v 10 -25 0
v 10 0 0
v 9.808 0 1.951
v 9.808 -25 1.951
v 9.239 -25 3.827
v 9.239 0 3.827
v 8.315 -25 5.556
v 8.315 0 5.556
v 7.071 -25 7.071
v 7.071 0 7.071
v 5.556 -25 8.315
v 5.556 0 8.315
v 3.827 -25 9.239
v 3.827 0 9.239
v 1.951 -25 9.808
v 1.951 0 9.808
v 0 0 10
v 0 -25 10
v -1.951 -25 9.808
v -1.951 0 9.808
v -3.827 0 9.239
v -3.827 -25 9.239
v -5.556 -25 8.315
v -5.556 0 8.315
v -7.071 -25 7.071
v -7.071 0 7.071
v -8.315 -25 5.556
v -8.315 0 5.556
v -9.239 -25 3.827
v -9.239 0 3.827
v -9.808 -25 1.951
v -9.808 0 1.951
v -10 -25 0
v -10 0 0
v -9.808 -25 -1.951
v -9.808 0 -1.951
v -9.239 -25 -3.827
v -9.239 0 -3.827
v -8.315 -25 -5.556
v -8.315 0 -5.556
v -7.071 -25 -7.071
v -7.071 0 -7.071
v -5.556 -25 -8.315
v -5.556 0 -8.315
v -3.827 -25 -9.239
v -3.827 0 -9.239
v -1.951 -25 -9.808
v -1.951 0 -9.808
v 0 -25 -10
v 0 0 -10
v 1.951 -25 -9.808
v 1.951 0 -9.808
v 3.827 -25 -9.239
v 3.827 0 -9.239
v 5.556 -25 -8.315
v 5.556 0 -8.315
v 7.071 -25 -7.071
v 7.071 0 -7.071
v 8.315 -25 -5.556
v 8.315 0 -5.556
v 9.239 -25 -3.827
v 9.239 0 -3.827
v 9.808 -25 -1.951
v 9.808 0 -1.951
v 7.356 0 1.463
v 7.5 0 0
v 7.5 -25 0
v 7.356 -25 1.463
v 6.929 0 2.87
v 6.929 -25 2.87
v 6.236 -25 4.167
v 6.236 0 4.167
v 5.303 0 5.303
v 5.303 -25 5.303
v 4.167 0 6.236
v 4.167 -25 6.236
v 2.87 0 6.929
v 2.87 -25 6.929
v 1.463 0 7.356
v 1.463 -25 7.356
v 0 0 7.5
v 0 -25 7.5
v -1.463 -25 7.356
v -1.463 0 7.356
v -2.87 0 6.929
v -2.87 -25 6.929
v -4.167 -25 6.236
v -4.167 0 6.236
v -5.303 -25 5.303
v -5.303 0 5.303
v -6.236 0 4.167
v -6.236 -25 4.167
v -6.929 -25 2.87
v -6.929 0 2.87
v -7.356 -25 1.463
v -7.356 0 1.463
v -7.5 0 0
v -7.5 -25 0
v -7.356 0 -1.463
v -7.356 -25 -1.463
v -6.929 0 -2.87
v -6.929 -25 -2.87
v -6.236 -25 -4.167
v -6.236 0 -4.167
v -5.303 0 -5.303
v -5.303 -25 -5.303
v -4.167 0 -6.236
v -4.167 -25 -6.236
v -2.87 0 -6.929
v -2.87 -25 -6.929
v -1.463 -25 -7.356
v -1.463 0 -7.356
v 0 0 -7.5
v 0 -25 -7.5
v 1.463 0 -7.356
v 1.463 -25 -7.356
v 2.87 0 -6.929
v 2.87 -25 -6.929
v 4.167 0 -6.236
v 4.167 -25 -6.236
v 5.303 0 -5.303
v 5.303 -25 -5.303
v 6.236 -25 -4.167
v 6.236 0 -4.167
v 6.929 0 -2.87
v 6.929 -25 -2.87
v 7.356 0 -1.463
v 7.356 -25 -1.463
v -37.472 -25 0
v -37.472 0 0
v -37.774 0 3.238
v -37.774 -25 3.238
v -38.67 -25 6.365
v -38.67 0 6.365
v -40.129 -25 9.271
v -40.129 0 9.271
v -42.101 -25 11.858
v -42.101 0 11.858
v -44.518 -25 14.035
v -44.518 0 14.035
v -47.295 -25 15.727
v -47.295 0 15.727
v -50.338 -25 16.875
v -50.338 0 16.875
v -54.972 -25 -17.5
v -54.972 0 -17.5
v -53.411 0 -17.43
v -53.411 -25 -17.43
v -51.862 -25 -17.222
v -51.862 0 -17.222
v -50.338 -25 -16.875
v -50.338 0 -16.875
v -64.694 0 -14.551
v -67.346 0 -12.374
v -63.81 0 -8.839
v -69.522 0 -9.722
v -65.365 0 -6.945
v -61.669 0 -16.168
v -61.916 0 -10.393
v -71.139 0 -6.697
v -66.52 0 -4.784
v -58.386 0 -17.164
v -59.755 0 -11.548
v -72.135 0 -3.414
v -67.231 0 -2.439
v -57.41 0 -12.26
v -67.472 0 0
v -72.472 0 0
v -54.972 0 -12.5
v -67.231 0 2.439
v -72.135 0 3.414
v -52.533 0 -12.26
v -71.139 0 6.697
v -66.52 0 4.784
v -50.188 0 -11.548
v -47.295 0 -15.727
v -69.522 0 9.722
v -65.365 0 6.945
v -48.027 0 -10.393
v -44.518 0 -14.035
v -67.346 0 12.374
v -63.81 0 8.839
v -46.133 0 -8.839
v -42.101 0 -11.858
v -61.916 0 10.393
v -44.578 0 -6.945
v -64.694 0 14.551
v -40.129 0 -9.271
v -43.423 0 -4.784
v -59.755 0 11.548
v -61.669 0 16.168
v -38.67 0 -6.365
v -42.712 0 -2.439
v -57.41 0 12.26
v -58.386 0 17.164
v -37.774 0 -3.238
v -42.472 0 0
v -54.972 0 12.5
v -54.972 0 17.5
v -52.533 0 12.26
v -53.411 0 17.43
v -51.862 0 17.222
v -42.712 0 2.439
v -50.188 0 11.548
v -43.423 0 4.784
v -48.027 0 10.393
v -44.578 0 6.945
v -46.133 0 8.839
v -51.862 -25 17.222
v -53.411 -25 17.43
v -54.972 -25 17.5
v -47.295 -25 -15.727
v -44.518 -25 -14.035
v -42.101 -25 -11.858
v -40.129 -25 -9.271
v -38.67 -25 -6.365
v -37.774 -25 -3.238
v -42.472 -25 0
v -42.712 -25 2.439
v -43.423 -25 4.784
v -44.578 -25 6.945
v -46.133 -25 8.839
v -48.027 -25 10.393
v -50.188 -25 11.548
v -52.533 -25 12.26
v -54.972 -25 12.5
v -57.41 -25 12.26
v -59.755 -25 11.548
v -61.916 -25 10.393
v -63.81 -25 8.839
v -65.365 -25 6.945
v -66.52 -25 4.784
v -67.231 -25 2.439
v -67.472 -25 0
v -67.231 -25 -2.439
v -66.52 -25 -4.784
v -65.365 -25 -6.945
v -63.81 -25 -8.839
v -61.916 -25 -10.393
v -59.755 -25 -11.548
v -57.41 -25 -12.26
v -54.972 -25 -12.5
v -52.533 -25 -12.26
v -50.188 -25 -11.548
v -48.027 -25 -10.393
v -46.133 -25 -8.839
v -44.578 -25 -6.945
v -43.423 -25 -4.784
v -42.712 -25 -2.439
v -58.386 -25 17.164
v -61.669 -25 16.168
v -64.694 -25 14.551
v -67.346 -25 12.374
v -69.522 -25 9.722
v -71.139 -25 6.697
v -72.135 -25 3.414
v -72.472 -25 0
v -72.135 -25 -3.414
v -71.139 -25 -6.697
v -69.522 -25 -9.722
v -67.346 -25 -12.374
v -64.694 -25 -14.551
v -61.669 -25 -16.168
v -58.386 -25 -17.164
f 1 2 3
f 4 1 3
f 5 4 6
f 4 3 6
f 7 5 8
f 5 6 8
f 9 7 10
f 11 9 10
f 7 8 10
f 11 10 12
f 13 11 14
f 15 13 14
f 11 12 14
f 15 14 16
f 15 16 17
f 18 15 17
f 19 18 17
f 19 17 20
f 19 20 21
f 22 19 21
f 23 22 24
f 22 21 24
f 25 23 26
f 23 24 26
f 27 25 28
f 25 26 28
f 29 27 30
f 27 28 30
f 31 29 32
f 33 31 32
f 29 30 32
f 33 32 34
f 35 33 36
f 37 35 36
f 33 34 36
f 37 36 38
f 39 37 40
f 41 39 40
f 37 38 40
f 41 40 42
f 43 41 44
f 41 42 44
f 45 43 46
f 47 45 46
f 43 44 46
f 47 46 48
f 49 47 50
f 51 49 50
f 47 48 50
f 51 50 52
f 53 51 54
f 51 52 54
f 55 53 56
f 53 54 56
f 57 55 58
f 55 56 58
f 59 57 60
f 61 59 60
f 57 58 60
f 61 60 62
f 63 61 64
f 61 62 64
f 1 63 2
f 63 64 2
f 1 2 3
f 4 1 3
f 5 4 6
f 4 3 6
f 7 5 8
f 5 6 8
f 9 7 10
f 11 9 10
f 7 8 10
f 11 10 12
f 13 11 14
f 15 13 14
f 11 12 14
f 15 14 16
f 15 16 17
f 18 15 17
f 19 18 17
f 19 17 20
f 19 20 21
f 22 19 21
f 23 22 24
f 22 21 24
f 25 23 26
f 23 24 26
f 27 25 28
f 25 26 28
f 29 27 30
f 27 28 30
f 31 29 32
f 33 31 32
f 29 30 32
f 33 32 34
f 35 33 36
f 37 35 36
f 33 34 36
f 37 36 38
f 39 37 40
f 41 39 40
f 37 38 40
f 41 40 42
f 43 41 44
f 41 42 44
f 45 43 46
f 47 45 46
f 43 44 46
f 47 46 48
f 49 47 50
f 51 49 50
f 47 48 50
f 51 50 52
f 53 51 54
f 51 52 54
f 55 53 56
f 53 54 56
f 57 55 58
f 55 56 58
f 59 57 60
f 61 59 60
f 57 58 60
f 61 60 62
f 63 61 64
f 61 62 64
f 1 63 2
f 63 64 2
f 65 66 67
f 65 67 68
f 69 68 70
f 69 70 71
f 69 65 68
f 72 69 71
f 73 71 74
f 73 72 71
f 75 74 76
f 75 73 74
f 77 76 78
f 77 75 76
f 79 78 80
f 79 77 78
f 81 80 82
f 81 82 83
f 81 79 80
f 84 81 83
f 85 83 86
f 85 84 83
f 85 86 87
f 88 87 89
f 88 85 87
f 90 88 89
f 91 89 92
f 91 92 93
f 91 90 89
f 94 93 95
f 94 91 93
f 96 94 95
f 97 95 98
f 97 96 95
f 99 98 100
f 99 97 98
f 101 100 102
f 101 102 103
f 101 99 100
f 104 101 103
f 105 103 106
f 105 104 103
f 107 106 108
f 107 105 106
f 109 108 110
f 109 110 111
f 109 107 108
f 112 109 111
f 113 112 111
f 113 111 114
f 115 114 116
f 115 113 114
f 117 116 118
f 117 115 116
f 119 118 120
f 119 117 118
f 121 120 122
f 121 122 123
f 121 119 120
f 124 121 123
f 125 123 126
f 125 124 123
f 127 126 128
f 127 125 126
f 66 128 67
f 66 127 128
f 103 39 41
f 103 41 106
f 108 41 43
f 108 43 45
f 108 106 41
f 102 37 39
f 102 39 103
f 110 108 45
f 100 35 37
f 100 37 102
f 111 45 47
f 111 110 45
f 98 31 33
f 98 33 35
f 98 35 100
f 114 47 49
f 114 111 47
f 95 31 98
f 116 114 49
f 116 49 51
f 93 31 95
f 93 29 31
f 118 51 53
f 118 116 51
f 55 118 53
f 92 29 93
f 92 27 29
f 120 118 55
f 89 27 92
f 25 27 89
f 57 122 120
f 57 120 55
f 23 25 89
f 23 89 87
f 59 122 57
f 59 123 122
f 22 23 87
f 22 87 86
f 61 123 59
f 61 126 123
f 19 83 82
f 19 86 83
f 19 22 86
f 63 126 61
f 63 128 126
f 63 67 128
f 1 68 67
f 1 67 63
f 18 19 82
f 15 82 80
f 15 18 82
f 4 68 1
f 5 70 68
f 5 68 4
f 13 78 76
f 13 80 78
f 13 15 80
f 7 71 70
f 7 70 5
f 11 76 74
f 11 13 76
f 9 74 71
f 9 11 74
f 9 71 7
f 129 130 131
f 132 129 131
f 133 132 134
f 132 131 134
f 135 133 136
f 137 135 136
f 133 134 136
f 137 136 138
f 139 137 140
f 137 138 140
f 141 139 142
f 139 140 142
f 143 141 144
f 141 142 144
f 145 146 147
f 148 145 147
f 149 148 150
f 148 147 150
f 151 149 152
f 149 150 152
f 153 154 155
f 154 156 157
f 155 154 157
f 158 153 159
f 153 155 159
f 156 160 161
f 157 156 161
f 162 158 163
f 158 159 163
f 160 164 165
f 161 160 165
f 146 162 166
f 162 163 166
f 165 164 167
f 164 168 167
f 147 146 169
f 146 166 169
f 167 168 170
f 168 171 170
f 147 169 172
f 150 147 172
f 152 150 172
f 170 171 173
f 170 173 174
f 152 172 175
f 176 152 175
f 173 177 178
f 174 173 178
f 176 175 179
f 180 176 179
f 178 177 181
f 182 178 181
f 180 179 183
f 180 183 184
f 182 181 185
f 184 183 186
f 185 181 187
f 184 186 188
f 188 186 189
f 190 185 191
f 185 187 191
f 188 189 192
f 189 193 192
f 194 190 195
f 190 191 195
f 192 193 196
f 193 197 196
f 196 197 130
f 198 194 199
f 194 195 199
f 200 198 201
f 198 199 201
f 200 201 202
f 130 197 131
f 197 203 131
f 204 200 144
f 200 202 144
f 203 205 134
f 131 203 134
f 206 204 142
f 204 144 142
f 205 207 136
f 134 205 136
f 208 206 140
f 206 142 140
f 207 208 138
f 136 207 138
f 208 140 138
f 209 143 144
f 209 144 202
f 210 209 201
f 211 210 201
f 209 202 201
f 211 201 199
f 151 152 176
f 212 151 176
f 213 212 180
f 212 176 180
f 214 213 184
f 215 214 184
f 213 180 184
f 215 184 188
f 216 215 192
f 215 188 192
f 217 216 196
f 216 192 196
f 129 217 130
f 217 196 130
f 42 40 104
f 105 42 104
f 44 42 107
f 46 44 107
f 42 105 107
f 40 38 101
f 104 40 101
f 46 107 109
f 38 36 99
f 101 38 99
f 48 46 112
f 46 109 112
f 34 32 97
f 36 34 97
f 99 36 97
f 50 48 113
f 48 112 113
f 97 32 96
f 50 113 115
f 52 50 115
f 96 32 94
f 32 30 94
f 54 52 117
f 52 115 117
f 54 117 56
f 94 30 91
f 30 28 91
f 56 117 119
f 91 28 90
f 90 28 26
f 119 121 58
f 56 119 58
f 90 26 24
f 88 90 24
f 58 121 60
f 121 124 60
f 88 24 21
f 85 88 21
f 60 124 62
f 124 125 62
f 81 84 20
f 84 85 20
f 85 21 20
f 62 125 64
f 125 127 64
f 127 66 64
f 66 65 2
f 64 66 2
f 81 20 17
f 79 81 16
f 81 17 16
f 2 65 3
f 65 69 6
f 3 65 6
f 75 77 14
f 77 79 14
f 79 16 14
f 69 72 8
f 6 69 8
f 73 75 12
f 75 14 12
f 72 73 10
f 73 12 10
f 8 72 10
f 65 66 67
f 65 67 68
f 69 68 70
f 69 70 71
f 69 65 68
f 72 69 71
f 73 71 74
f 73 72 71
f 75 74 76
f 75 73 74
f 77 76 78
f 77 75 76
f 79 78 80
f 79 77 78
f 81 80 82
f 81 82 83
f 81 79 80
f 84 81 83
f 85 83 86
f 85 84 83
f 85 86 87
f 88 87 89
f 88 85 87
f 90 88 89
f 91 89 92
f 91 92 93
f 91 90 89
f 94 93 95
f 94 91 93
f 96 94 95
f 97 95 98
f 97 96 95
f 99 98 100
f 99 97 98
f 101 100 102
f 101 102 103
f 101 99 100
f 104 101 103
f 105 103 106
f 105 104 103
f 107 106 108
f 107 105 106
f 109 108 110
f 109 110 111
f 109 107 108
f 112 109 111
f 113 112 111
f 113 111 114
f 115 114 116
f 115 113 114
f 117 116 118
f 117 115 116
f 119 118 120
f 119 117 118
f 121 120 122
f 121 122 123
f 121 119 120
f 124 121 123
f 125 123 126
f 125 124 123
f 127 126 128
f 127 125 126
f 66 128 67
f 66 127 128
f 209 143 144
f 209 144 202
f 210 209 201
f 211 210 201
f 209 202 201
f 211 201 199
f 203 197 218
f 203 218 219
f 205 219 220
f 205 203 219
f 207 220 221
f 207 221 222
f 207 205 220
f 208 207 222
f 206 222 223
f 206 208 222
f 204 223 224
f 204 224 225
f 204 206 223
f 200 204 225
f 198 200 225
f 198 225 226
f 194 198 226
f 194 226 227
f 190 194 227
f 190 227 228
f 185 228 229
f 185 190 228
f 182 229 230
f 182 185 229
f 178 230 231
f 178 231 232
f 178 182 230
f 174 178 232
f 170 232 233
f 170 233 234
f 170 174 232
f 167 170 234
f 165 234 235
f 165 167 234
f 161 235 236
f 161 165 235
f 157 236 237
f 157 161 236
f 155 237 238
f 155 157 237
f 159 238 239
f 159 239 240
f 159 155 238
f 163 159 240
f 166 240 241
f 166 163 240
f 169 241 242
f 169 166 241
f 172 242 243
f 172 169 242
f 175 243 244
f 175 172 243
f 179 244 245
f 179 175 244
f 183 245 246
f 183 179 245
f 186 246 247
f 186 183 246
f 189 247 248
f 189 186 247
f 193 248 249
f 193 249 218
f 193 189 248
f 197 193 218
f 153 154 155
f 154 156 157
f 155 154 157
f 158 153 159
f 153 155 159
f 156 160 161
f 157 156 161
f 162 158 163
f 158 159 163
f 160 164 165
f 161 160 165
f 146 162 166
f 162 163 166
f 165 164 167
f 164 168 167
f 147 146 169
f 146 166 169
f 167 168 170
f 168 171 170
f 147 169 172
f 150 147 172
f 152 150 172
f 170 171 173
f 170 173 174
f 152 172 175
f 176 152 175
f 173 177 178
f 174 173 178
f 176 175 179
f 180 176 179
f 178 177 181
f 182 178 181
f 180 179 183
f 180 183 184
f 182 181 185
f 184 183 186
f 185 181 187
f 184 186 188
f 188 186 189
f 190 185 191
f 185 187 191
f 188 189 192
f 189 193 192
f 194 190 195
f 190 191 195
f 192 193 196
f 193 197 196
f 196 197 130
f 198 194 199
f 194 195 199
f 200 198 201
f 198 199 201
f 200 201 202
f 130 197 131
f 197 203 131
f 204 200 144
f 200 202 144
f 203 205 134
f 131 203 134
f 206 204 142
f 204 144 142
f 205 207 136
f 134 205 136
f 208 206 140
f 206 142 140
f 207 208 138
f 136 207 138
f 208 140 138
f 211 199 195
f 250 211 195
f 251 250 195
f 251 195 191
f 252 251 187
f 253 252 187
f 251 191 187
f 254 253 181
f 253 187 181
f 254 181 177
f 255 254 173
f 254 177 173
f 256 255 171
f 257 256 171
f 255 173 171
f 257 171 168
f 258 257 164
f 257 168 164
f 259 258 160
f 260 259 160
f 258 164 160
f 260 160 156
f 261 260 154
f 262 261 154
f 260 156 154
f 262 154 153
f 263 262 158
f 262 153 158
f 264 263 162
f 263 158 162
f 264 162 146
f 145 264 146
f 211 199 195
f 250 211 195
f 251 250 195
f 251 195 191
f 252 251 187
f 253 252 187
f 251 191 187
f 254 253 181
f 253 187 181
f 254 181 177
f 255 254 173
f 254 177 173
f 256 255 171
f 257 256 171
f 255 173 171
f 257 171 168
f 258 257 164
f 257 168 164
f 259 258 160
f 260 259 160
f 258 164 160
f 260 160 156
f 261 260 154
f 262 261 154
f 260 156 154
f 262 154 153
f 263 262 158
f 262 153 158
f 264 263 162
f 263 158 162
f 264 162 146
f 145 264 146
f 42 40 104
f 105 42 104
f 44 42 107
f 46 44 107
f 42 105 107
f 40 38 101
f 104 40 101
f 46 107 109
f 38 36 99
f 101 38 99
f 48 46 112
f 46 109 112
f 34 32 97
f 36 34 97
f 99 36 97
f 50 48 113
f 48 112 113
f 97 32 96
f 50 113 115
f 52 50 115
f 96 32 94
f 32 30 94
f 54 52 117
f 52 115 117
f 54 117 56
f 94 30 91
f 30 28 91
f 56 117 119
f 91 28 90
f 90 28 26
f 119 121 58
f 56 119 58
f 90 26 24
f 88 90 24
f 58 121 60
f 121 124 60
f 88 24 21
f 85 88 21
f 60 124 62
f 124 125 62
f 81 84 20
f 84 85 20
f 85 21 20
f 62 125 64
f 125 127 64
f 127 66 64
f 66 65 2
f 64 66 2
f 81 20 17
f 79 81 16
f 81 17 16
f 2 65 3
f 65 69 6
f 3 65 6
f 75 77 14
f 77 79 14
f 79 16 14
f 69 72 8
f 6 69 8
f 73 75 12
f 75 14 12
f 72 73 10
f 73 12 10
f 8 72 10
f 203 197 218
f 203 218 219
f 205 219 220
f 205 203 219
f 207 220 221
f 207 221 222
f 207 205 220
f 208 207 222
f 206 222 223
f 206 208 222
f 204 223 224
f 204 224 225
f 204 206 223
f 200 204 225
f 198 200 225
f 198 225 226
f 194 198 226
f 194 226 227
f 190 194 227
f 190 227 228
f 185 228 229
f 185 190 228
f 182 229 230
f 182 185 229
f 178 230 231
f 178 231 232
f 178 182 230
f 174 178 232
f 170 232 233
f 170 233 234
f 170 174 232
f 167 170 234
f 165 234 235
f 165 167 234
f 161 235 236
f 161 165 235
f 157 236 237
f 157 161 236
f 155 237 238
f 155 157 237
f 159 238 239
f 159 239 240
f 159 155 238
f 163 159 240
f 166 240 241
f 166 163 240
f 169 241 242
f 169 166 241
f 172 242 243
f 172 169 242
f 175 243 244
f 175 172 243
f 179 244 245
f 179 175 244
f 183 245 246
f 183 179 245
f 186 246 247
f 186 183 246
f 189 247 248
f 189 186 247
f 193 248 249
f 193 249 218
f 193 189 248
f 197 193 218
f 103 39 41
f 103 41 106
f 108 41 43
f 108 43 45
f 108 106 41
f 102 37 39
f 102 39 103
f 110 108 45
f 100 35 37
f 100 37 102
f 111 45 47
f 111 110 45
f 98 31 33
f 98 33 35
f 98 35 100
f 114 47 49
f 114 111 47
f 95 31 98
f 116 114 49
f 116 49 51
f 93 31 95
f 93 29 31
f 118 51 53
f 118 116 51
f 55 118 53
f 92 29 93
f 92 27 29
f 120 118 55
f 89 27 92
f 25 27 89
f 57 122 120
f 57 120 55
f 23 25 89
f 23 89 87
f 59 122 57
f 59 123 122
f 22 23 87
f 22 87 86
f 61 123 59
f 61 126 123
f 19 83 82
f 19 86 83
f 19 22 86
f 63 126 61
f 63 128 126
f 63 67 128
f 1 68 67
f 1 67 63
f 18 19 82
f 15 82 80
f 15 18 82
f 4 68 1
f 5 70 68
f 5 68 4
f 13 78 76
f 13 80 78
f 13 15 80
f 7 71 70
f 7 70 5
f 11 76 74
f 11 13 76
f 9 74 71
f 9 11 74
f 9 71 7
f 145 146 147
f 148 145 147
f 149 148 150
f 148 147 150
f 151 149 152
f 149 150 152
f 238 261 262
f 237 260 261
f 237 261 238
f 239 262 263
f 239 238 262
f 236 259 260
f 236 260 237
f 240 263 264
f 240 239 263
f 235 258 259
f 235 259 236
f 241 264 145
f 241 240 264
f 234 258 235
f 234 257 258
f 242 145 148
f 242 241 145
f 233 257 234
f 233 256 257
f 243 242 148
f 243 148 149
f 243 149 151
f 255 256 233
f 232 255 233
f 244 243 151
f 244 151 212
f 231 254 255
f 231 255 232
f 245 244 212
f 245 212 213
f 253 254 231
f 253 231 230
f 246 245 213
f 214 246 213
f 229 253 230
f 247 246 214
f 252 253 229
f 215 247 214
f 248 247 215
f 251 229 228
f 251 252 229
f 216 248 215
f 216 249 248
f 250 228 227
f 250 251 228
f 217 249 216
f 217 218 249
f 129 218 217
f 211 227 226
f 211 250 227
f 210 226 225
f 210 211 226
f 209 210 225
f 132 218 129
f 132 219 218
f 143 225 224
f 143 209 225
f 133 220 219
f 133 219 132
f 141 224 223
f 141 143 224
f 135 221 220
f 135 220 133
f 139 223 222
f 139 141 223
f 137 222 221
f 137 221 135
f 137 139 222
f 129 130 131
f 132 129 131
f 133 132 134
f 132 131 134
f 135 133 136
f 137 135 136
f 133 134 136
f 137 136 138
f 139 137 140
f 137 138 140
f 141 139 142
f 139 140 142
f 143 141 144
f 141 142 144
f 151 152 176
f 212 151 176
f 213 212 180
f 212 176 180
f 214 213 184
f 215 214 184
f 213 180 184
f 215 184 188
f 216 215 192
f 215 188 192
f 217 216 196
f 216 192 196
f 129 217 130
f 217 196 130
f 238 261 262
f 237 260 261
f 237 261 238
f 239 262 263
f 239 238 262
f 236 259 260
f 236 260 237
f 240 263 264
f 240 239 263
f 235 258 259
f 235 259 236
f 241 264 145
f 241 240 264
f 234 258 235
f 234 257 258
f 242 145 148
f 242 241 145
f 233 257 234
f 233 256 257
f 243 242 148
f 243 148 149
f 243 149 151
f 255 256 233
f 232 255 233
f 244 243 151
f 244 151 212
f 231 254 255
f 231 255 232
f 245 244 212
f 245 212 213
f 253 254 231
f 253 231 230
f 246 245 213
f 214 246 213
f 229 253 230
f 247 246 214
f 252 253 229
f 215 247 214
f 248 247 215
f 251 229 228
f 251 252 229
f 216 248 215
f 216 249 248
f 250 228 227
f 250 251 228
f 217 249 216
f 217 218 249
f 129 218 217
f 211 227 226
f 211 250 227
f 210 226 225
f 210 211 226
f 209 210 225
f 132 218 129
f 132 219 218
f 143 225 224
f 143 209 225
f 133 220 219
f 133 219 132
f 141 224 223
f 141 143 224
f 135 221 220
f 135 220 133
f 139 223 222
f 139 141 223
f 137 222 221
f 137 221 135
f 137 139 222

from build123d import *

# Parameters (mm, degrees)
F0_R     = 12.5
F0_R_2   = 10
F0_R_3   = 7.5
F1_DEPTH = 25
F2_DEPTH = 25


with BuildPart() as f1:
    # F0 (on Front) → F1 (new body)
    with BuildSketch(Plane.XZ):
        with BuildLine():
            Line((-50.338149, 16.875463), (-54.971586, 17.5))
            ThreePointArc((-54.971586, 17.5), (-72.471586, 0), (-54.971586, -17.5))
            Line((-54.971586, -17.5), (-50.338149, -16.875463))
            ThreePointArc((-50.338149, -16.875463), (-41.055136, -10.610487), (-37.471586, 0))
            ThreePointArc((-37.471586, 0), (-41.055136, 10.610487), (-50.338149, 16.875463))
        make_face()
        with Locations((-54.971586, 0)):
            Circle(F0_R, mode=Mode.SUBTRACT)
        with BuildLine():
            ThreePointArc((-50.338149, 16.875463), (-52.633917, 17.343163), (-54.971586, 17.5))
            Line((-54.971586, 17.5), (-50.338149, 16.875463))
        make_face()
        with BuildLine():
            Line((-50.338149, -16.875463), (-54.971586, -17.5))
            ThreePointArc((-54.971586, -17.5), (-52.633917, -17.343163), (-50.338149, -16.875463))
        make_face()
        Circle(F0_R_2)
        Circle(F0_R_3, mode=Mode.SUBTRACT)
    extrude(amount=F1_DEPTH)


with BuildPart() as f2:
    # F0 (on Front) → F2 (new body)
    with BuildSketch(Plane.XZ):
        with BuildLine():
            Line((-50.338149, 16.875463), (-54.971586, 17.5))
            ThreePointArc((-54.971586, 17.5), (-72.471586, 0), (-54.971586, -17.5))
            Line((-54.971586, -17.5), (-50.338149, -16.875463))
            ThreePointArc((-50.338149, -16.875463), (-41.055136, -10.610487), (-37.471586, 0))
            ThreePointArc((-37.471586, 0), (-41.055136, 10.610487), (-50.338149, 16.875463))
        make_face()
        with Locations((-54.971586, 0)):
            Circle(F0_R, mode=Mode.SUBTRACT)
        with BuildLine():
            ThreePointArc((-50.338149, 16.875463), (-52.633917, 17.343163), (-54.971586, 17.5))
            Line((-54.971586, 17.5), (-50.338149, 16.875463))
        make_face()
        with BuildLine():
            Line((-50.338149, -16.875463), (-54.971586, -17.5))
            ThreePointArc((-54.971586, -17.5), (-52.633917, -17.343163), (-50.338149, -16.875463))
        make_face()
        Circle(F0_R_2)
        Circle(F0_R_3, mode=Mode.SUBTRACT)
    extrude(amount=F2_DEPTH)


solid = Compound([f1.part, f2.part])
